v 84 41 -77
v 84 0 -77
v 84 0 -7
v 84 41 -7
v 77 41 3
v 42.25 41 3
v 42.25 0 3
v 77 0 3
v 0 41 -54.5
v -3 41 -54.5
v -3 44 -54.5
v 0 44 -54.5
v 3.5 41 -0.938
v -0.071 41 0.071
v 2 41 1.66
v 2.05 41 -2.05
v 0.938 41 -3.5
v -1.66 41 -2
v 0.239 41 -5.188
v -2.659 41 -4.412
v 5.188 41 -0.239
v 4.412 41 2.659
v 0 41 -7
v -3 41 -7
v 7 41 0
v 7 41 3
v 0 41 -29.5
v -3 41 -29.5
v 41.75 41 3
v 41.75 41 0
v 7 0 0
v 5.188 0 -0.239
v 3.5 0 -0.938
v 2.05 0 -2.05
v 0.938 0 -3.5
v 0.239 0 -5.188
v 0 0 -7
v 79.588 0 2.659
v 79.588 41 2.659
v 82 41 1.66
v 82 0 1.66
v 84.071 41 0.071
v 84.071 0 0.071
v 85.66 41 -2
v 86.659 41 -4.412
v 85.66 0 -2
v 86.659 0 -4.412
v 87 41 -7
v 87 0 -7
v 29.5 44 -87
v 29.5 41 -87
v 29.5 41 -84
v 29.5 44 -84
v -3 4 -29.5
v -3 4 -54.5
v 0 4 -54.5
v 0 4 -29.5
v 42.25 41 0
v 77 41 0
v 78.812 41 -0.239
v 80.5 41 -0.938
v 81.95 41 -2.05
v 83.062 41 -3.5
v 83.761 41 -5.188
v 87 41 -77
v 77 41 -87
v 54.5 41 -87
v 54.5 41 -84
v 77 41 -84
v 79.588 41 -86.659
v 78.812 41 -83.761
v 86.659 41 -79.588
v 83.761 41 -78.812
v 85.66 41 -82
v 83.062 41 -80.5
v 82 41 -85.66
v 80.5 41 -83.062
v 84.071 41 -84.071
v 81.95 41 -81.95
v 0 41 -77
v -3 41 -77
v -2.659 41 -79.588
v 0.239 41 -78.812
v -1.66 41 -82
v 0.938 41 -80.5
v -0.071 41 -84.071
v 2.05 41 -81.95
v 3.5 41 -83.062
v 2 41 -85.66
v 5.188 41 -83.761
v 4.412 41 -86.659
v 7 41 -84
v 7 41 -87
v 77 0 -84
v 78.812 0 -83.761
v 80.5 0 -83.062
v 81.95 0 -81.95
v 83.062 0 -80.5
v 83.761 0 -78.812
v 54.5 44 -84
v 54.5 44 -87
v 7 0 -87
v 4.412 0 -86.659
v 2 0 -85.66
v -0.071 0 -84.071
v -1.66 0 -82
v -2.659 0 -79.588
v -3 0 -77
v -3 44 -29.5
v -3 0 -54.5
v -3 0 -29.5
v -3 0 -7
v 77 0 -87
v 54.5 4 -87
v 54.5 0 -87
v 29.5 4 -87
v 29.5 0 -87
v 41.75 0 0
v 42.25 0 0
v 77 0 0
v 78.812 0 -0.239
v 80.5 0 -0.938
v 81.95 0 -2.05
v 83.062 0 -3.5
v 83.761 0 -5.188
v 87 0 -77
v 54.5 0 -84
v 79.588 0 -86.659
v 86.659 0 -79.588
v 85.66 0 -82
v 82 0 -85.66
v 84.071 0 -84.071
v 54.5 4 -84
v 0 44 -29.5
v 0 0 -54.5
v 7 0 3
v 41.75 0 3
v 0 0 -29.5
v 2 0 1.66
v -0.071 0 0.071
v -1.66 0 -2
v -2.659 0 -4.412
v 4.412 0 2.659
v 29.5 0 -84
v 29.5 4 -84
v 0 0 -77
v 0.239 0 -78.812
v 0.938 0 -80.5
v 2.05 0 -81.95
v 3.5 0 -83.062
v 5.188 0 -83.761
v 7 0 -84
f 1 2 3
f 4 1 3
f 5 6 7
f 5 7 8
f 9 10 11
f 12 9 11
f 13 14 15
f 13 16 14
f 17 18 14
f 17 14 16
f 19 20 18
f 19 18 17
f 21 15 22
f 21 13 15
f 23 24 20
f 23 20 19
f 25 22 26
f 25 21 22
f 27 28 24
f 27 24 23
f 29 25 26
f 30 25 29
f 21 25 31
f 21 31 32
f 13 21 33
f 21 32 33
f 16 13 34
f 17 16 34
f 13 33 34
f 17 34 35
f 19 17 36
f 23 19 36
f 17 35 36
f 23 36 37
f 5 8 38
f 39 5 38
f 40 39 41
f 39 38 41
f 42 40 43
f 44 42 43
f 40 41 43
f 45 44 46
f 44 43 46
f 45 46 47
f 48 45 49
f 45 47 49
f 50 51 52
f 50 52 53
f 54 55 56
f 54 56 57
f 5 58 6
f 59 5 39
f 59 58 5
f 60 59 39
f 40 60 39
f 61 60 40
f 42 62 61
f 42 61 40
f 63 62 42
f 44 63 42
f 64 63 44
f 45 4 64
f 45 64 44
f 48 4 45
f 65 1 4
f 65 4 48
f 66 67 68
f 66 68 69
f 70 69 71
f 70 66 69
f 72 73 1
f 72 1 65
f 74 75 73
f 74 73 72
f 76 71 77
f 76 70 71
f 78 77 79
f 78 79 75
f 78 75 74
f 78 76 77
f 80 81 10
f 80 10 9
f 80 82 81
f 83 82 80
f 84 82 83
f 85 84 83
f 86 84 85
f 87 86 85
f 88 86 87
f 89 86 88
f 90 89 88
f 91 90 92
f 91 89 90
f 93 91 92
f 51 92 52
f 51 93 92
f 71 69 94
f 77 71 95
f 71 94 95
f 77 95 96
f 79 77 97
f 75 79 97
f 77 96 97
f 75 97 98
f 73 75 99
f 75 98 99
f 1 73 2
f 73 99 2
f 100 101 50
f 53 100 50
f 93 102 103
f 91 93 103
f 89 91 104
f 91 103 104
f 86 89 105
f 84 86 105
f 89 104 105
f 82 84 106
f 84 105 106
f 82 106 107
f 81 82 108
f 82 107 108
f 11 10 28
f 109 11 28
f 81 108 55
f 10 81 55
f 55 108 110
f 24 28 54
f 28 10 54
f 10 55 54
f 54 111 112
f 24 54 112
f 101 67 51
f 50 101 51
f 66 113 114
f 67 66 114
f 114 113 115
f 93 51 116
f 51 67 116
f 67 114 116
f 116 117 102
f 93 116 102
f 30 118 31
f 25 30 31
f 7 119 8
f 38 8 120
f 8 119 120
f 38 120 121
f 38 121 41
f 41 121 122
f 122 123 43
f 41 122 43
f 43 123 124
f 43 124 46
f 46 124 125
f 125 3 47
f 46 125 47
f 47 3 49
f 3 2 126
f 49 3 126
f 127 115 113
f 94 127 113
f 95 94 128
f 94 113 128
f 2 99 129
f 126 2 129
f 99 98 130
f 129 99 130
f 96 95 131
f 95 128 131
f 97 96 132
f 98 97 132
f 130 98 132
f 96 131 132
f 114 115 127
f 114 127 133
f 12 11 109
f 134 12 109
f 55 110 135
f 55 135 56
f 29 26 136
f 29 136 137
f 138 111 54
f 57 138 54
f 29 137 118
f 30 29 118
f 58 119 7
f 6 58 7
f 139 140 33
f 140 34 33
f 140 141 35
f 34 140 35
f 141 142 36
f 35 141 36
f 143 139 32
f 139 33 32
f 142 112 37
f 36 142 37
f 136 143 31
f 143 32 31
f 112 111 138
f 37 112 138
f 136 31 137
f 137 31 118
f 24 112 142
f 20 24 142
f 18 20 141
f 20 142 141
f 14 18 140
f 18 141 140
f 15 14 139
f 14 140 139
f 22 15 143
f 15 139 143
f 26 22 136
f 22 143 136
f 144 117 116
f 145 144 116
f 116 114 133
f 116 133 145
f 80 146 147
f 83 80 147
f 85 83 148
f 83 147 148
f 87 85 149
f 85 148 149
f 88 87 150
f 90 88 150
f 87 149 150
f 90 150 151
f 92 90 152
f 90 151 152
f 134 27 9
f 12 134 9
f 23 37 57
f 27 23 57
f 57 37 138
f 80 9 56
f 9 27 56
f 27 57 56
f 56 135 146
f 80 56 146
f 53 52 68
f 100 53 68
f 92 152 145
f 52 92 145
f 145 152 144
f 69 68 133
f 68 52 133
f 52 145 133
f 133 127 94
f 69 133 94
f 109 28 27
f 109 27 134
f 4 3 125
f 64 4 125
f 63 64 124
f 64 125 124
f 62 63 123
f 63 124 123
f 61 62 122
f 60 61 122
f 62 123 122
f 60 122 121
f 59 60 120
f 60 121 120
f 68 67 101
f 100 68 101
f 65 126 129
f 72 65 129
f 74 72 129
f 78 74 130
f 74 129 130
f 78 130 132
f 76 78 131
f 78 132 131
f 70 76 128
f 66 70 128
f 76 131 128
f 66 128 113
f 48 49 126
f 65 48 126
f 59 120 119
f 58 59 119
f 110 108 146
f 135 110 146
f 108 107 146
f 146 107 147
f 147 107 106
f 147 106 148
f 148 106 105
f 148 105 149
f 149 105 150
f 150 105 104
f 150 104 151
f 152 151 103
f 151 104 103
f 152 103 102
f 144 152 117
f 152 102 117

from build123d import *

# Parameters (mm, degrees)
BASE_FLANGE1_DEPTH  = 41
SKETCH8_W           = 25
SKETCH8_H           = 8
CUT_EXTRUDE1_DEPTH  = 5
SKETCH9_W           = 25
SKETCH9_H           = 8
CUT_EXTRUDE2_DEPTH  = 5
SKETCH10_W          = 25
SKETCH10_H          = 6
BOSS_EXTRUDE1_DEPTH = 3
SKETCH11_W          = 25
SKETCH11_H          = 6
BOSS_EXTRUDE2_DEPTH = 3


# Read off the part's stored shape, not the designer's step: Base-Flange1
with BuildPart() as part:
    # Base-Flange1 outline → Base-Flange1 (new body)
    with BuildSketch(Plane(origin=(0, 0, 0), x_dir=(1, 0, 0), z_dir=(0, 1, 0))):
        with BuildLine():
            Line((7, -3), (41.75, -3))
            Line((41.75, -3), (41.75, 0))
            Line((41.75, 0), (7, 0))
            ThreePointArc((7, 0), (2.050252532, 2.050252532), (0, 7))
            Line((0, 7), (0, 77))
            ThreePointArc((0, 77), (2.050252532, 81.949747468), (7, 84))
            Line((7, 84), (77, 84))
            ThreePointArc((77, 84), (81.949747468, 81.949747468), (84, 77))
            Line((84, 77), (84, 7))
            ThreePointArc((84, 7), (81.949747468, 2.050252532), (77, 0))
            Line((77, 0), (42.25, 0))
            Line((42.25, 0), (42.25, -3))
            Line((42.25, -3), (77, -3))
            ThreePointArc((77, -3), (84.071067812, -0.071067812), (87, 7))
            Line((87, 7), (87, 77))
            ThreePointArc((87, 77), (84.071067812, 84.071067812), (77, 87))
            Line((77, 87), (7, 87))
            ThreePointArc((7, 87), (-0.071067812, 84.071067812), (-3, 77))
            Line((-3, 77), (-3, 7))
            ThreePointArc((-3, 7), (-0.071067812, -0.071067812), (7, -3))
        make_face()
    extrude(amount=BASE_FLANGE1_DEPTH)

    # Sketch8 → Cut-Extrude1 (cut)
    with BuildSketch(Plane(origin=(0, 0, -87), x_dir=(-1, 0, 0), z_dir=(0, 0, -1))):
        with Locations((-42, 0)):
            Rectangle(SKETCH8_W, SKETCH8_H)
    extrude(amount=-CUT_EXTRUDE1_DEPTH, mode=Mode.SUBTRACT)

    # Sketch9 → Cut-Extrude2 (cut)
    with BuildSketch(Plane.ZY.offset(3)):
        with Locations((-42, 0)):
            Rectangle(SKETCH9_W, SKETCH9_H)
    extrude(amount=-CUT_EXTRUDE2_DEPTH, mode=Mode.SUBTRACT)

    # Sketch10 → Boss-Extrude1 (add)
    with BuildSketch(Plane(origin=(0, 0, -87), x_dir=(-1, 0, 0), z_dir=(0, 0, -1))):
        with Locations((-42, 41)):
            Rectangle(SKETCH10_W, SKETCH10_H)
    extrude(amount=-BOSS_EXTRUDE1_DEPTH)

    # Sketch11 → Boss-Extrude2 (add)
    with BuildSketch(Plane.ZY.offset(3)):
        with Locations((-42, 41)):
            Rectangle(SKETCH11_W, SKETCH11_H)
    extrude(amount=-BOSS_EXTRUDE2_DEPTH)


solid = part.part
